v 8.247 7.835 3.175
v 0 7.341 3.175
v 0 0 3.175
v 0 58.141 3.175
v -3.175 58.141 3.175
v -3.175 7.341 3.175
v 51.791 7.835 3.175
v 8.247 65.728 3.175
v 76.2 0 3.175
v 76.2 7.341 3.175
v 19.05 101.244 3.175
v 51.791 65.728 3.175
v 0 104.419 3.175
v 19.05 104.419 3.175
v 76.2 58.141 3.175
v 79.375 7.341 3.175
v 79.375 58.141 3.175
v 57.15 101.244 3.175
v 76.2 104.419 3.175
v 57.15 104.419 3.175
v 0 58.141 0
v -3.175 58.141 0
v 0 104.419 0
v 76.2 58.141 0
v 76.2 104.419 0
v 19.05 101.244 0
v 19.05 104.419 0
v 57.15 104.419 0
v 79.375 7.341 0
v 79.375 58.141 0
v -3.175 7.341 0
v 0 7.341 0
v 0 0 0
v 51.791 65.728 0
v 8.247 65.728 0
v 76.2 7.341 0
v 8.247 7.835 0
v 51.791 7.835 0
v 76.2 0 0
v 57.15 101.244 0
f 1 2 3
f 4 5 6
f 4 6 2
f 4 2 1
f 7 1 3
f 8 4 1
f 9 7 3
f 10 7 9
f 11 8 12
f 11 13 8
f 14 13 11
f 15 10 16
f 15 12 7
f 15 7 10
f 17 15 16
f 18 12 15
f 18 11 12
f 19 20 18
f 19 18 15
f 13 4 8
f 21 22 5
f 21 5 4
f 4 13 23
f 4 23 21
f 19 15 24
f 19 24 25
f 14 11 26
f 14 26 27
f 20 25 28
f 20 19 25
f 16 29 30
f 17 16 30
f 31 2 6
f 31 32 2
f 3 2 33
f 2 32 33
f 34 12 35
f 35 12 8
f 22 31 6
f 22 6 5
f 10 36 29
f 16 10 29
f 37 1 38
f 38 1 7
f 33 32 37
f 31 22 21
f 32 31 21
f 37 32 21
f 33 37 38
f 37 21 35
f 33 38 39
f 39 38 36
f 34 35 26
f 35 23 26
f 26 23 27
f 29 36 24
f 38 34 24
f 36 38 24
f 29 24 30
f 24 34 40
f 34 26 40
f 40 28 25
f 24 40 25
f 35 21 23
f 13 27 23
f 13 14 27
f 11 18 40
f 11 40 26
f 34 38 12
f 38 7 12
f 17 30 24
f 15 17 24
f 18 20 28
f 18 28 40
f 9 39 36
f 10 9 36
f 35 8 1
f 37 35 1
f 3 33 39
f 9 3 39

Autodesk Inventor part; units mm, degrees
ref_plane "YZ Plane" through (0, 0, 0) normal (1, 0, 0) x (0, 1, 0)
ref_plane "XZ Plane" through (0, 0, 0) normal (0, 1, 0) x (-1, 0, 0)
ref_plane "XY Plane" through (0, 0, 0) normal (0, 0, 1) x (1, 0, 0)
sketch "Sketch1" plane through (0, 0, 0) normal (0, 0, 1) x (1, 0, 0)
  line L0 (0, 0) -> (76.2, 0)
  line L1 (76.2, 0) -> (76.2, 79.0194)
  line L2 (76.2, 79.0194) -> (0, 79.0194)
  line L3 (0, 79.0194) -> (0, 0)
  line L4 (0, 7.3406) -> (-3.175, 7.3406)
  line L5 (-3.175, 7.3406) -> (-3.175, 58.1406)
  line L6 (-3.175, 58.1406) -> (0, 58.1406)
  line L7 (0, 58.1406) -> (0, 7.3406)
  line L8 (38.1, 79.0194) -> (38.1, 15.1376) construction
  line L9 (76.2, 0) -> (0, 0)
  line L10 (76.2, 79.0194) -> (76.2, 0)
  line L11 (76.2, 7.3406) -> (79.375, 7.3406)
  line L12 (79.375, 7.3406) -> (79.375, 58.1406)
  line L13 (79.375, 58.1406) -> (76.2, 58.1406)
  line L14 (76.2, 58.1406) -> (76.2, 7.3406)
  dimension "d0" = 76.2
  dimension "d1" = 79.0194
  dimension "d2" = 7.3406
  dimension "d3" = 50.8
  dimension "d6" = 3.175
extrude "Extrusion1" add sketch "Sketch1" along normal blind 3.175
sketch "Sketch2" plane through (0, 0, 3.175) normal (0, 0, 1) x (1, 0, 0)
  line L0 (76.2, 79.0194) -> (0, 79.0194) projected
  line L1 (0, 79.0194) -> (76.2, 79.0194)
  line L2 (76.2, 79.0194) -> (76.2, 104.4194)
  line L3 (76.2, 104.4194) -> (0, 104.4194)
  line L4 (0, 104.4194) -> (0, 79.0194)
  point P0 (0, 0)
  dimension "d7" = 25.4
extrude "Extrusion2" add sketch "Sketch2" against normal blind 3.175
sketch "Sketch3" plane through (0, 0, 3.175) normal (0, 0, 1) x (1, 0, 0)
  line L0 (76.2, 104.4194) -> (0, 104.4194) projected
  line L1 (19.05, 104.4194) -> (57.15, 104.4194)
  line L2 (57.15, 104.4194) -> (57.15, 101.2444)
  line L3 (57.15, 101.2444) -> (19.05, 101.2444)
  line L4 (19.05, 101.2444) -> (19.05, 104.4194)
  line L5 (0, 104.4194) -> (0, 58.1406) projected
  point P0 (0, 0)
  dimension "d10" = 3.175
  dimension "d11" = 38.1
  dimension "d12" = 19.05
extrude "Extrusion3" cut sketch "Sketch3" against normal blind 3.175
sketch "Sketch5" plane through (0, 0, 3.175) normal (0, 0, 1) x (1, 0, 0)
  line L0 (51.7909, 65.7282) -> (8.247, 65.7282)
  line L1 (8.247, 65.7282) -> (8.247, 7.8346)
  line L2 (8.247, 7.8346) -> (51.7909, 7.8346)
  line L3 (51.7909, 7.8346) -> (51.7909, 65.7282)
  point P0 (0, 0)
extrude "Extrusion4" cut sketch "Sketch5" against normal blind 25.4
properties part number "front"
